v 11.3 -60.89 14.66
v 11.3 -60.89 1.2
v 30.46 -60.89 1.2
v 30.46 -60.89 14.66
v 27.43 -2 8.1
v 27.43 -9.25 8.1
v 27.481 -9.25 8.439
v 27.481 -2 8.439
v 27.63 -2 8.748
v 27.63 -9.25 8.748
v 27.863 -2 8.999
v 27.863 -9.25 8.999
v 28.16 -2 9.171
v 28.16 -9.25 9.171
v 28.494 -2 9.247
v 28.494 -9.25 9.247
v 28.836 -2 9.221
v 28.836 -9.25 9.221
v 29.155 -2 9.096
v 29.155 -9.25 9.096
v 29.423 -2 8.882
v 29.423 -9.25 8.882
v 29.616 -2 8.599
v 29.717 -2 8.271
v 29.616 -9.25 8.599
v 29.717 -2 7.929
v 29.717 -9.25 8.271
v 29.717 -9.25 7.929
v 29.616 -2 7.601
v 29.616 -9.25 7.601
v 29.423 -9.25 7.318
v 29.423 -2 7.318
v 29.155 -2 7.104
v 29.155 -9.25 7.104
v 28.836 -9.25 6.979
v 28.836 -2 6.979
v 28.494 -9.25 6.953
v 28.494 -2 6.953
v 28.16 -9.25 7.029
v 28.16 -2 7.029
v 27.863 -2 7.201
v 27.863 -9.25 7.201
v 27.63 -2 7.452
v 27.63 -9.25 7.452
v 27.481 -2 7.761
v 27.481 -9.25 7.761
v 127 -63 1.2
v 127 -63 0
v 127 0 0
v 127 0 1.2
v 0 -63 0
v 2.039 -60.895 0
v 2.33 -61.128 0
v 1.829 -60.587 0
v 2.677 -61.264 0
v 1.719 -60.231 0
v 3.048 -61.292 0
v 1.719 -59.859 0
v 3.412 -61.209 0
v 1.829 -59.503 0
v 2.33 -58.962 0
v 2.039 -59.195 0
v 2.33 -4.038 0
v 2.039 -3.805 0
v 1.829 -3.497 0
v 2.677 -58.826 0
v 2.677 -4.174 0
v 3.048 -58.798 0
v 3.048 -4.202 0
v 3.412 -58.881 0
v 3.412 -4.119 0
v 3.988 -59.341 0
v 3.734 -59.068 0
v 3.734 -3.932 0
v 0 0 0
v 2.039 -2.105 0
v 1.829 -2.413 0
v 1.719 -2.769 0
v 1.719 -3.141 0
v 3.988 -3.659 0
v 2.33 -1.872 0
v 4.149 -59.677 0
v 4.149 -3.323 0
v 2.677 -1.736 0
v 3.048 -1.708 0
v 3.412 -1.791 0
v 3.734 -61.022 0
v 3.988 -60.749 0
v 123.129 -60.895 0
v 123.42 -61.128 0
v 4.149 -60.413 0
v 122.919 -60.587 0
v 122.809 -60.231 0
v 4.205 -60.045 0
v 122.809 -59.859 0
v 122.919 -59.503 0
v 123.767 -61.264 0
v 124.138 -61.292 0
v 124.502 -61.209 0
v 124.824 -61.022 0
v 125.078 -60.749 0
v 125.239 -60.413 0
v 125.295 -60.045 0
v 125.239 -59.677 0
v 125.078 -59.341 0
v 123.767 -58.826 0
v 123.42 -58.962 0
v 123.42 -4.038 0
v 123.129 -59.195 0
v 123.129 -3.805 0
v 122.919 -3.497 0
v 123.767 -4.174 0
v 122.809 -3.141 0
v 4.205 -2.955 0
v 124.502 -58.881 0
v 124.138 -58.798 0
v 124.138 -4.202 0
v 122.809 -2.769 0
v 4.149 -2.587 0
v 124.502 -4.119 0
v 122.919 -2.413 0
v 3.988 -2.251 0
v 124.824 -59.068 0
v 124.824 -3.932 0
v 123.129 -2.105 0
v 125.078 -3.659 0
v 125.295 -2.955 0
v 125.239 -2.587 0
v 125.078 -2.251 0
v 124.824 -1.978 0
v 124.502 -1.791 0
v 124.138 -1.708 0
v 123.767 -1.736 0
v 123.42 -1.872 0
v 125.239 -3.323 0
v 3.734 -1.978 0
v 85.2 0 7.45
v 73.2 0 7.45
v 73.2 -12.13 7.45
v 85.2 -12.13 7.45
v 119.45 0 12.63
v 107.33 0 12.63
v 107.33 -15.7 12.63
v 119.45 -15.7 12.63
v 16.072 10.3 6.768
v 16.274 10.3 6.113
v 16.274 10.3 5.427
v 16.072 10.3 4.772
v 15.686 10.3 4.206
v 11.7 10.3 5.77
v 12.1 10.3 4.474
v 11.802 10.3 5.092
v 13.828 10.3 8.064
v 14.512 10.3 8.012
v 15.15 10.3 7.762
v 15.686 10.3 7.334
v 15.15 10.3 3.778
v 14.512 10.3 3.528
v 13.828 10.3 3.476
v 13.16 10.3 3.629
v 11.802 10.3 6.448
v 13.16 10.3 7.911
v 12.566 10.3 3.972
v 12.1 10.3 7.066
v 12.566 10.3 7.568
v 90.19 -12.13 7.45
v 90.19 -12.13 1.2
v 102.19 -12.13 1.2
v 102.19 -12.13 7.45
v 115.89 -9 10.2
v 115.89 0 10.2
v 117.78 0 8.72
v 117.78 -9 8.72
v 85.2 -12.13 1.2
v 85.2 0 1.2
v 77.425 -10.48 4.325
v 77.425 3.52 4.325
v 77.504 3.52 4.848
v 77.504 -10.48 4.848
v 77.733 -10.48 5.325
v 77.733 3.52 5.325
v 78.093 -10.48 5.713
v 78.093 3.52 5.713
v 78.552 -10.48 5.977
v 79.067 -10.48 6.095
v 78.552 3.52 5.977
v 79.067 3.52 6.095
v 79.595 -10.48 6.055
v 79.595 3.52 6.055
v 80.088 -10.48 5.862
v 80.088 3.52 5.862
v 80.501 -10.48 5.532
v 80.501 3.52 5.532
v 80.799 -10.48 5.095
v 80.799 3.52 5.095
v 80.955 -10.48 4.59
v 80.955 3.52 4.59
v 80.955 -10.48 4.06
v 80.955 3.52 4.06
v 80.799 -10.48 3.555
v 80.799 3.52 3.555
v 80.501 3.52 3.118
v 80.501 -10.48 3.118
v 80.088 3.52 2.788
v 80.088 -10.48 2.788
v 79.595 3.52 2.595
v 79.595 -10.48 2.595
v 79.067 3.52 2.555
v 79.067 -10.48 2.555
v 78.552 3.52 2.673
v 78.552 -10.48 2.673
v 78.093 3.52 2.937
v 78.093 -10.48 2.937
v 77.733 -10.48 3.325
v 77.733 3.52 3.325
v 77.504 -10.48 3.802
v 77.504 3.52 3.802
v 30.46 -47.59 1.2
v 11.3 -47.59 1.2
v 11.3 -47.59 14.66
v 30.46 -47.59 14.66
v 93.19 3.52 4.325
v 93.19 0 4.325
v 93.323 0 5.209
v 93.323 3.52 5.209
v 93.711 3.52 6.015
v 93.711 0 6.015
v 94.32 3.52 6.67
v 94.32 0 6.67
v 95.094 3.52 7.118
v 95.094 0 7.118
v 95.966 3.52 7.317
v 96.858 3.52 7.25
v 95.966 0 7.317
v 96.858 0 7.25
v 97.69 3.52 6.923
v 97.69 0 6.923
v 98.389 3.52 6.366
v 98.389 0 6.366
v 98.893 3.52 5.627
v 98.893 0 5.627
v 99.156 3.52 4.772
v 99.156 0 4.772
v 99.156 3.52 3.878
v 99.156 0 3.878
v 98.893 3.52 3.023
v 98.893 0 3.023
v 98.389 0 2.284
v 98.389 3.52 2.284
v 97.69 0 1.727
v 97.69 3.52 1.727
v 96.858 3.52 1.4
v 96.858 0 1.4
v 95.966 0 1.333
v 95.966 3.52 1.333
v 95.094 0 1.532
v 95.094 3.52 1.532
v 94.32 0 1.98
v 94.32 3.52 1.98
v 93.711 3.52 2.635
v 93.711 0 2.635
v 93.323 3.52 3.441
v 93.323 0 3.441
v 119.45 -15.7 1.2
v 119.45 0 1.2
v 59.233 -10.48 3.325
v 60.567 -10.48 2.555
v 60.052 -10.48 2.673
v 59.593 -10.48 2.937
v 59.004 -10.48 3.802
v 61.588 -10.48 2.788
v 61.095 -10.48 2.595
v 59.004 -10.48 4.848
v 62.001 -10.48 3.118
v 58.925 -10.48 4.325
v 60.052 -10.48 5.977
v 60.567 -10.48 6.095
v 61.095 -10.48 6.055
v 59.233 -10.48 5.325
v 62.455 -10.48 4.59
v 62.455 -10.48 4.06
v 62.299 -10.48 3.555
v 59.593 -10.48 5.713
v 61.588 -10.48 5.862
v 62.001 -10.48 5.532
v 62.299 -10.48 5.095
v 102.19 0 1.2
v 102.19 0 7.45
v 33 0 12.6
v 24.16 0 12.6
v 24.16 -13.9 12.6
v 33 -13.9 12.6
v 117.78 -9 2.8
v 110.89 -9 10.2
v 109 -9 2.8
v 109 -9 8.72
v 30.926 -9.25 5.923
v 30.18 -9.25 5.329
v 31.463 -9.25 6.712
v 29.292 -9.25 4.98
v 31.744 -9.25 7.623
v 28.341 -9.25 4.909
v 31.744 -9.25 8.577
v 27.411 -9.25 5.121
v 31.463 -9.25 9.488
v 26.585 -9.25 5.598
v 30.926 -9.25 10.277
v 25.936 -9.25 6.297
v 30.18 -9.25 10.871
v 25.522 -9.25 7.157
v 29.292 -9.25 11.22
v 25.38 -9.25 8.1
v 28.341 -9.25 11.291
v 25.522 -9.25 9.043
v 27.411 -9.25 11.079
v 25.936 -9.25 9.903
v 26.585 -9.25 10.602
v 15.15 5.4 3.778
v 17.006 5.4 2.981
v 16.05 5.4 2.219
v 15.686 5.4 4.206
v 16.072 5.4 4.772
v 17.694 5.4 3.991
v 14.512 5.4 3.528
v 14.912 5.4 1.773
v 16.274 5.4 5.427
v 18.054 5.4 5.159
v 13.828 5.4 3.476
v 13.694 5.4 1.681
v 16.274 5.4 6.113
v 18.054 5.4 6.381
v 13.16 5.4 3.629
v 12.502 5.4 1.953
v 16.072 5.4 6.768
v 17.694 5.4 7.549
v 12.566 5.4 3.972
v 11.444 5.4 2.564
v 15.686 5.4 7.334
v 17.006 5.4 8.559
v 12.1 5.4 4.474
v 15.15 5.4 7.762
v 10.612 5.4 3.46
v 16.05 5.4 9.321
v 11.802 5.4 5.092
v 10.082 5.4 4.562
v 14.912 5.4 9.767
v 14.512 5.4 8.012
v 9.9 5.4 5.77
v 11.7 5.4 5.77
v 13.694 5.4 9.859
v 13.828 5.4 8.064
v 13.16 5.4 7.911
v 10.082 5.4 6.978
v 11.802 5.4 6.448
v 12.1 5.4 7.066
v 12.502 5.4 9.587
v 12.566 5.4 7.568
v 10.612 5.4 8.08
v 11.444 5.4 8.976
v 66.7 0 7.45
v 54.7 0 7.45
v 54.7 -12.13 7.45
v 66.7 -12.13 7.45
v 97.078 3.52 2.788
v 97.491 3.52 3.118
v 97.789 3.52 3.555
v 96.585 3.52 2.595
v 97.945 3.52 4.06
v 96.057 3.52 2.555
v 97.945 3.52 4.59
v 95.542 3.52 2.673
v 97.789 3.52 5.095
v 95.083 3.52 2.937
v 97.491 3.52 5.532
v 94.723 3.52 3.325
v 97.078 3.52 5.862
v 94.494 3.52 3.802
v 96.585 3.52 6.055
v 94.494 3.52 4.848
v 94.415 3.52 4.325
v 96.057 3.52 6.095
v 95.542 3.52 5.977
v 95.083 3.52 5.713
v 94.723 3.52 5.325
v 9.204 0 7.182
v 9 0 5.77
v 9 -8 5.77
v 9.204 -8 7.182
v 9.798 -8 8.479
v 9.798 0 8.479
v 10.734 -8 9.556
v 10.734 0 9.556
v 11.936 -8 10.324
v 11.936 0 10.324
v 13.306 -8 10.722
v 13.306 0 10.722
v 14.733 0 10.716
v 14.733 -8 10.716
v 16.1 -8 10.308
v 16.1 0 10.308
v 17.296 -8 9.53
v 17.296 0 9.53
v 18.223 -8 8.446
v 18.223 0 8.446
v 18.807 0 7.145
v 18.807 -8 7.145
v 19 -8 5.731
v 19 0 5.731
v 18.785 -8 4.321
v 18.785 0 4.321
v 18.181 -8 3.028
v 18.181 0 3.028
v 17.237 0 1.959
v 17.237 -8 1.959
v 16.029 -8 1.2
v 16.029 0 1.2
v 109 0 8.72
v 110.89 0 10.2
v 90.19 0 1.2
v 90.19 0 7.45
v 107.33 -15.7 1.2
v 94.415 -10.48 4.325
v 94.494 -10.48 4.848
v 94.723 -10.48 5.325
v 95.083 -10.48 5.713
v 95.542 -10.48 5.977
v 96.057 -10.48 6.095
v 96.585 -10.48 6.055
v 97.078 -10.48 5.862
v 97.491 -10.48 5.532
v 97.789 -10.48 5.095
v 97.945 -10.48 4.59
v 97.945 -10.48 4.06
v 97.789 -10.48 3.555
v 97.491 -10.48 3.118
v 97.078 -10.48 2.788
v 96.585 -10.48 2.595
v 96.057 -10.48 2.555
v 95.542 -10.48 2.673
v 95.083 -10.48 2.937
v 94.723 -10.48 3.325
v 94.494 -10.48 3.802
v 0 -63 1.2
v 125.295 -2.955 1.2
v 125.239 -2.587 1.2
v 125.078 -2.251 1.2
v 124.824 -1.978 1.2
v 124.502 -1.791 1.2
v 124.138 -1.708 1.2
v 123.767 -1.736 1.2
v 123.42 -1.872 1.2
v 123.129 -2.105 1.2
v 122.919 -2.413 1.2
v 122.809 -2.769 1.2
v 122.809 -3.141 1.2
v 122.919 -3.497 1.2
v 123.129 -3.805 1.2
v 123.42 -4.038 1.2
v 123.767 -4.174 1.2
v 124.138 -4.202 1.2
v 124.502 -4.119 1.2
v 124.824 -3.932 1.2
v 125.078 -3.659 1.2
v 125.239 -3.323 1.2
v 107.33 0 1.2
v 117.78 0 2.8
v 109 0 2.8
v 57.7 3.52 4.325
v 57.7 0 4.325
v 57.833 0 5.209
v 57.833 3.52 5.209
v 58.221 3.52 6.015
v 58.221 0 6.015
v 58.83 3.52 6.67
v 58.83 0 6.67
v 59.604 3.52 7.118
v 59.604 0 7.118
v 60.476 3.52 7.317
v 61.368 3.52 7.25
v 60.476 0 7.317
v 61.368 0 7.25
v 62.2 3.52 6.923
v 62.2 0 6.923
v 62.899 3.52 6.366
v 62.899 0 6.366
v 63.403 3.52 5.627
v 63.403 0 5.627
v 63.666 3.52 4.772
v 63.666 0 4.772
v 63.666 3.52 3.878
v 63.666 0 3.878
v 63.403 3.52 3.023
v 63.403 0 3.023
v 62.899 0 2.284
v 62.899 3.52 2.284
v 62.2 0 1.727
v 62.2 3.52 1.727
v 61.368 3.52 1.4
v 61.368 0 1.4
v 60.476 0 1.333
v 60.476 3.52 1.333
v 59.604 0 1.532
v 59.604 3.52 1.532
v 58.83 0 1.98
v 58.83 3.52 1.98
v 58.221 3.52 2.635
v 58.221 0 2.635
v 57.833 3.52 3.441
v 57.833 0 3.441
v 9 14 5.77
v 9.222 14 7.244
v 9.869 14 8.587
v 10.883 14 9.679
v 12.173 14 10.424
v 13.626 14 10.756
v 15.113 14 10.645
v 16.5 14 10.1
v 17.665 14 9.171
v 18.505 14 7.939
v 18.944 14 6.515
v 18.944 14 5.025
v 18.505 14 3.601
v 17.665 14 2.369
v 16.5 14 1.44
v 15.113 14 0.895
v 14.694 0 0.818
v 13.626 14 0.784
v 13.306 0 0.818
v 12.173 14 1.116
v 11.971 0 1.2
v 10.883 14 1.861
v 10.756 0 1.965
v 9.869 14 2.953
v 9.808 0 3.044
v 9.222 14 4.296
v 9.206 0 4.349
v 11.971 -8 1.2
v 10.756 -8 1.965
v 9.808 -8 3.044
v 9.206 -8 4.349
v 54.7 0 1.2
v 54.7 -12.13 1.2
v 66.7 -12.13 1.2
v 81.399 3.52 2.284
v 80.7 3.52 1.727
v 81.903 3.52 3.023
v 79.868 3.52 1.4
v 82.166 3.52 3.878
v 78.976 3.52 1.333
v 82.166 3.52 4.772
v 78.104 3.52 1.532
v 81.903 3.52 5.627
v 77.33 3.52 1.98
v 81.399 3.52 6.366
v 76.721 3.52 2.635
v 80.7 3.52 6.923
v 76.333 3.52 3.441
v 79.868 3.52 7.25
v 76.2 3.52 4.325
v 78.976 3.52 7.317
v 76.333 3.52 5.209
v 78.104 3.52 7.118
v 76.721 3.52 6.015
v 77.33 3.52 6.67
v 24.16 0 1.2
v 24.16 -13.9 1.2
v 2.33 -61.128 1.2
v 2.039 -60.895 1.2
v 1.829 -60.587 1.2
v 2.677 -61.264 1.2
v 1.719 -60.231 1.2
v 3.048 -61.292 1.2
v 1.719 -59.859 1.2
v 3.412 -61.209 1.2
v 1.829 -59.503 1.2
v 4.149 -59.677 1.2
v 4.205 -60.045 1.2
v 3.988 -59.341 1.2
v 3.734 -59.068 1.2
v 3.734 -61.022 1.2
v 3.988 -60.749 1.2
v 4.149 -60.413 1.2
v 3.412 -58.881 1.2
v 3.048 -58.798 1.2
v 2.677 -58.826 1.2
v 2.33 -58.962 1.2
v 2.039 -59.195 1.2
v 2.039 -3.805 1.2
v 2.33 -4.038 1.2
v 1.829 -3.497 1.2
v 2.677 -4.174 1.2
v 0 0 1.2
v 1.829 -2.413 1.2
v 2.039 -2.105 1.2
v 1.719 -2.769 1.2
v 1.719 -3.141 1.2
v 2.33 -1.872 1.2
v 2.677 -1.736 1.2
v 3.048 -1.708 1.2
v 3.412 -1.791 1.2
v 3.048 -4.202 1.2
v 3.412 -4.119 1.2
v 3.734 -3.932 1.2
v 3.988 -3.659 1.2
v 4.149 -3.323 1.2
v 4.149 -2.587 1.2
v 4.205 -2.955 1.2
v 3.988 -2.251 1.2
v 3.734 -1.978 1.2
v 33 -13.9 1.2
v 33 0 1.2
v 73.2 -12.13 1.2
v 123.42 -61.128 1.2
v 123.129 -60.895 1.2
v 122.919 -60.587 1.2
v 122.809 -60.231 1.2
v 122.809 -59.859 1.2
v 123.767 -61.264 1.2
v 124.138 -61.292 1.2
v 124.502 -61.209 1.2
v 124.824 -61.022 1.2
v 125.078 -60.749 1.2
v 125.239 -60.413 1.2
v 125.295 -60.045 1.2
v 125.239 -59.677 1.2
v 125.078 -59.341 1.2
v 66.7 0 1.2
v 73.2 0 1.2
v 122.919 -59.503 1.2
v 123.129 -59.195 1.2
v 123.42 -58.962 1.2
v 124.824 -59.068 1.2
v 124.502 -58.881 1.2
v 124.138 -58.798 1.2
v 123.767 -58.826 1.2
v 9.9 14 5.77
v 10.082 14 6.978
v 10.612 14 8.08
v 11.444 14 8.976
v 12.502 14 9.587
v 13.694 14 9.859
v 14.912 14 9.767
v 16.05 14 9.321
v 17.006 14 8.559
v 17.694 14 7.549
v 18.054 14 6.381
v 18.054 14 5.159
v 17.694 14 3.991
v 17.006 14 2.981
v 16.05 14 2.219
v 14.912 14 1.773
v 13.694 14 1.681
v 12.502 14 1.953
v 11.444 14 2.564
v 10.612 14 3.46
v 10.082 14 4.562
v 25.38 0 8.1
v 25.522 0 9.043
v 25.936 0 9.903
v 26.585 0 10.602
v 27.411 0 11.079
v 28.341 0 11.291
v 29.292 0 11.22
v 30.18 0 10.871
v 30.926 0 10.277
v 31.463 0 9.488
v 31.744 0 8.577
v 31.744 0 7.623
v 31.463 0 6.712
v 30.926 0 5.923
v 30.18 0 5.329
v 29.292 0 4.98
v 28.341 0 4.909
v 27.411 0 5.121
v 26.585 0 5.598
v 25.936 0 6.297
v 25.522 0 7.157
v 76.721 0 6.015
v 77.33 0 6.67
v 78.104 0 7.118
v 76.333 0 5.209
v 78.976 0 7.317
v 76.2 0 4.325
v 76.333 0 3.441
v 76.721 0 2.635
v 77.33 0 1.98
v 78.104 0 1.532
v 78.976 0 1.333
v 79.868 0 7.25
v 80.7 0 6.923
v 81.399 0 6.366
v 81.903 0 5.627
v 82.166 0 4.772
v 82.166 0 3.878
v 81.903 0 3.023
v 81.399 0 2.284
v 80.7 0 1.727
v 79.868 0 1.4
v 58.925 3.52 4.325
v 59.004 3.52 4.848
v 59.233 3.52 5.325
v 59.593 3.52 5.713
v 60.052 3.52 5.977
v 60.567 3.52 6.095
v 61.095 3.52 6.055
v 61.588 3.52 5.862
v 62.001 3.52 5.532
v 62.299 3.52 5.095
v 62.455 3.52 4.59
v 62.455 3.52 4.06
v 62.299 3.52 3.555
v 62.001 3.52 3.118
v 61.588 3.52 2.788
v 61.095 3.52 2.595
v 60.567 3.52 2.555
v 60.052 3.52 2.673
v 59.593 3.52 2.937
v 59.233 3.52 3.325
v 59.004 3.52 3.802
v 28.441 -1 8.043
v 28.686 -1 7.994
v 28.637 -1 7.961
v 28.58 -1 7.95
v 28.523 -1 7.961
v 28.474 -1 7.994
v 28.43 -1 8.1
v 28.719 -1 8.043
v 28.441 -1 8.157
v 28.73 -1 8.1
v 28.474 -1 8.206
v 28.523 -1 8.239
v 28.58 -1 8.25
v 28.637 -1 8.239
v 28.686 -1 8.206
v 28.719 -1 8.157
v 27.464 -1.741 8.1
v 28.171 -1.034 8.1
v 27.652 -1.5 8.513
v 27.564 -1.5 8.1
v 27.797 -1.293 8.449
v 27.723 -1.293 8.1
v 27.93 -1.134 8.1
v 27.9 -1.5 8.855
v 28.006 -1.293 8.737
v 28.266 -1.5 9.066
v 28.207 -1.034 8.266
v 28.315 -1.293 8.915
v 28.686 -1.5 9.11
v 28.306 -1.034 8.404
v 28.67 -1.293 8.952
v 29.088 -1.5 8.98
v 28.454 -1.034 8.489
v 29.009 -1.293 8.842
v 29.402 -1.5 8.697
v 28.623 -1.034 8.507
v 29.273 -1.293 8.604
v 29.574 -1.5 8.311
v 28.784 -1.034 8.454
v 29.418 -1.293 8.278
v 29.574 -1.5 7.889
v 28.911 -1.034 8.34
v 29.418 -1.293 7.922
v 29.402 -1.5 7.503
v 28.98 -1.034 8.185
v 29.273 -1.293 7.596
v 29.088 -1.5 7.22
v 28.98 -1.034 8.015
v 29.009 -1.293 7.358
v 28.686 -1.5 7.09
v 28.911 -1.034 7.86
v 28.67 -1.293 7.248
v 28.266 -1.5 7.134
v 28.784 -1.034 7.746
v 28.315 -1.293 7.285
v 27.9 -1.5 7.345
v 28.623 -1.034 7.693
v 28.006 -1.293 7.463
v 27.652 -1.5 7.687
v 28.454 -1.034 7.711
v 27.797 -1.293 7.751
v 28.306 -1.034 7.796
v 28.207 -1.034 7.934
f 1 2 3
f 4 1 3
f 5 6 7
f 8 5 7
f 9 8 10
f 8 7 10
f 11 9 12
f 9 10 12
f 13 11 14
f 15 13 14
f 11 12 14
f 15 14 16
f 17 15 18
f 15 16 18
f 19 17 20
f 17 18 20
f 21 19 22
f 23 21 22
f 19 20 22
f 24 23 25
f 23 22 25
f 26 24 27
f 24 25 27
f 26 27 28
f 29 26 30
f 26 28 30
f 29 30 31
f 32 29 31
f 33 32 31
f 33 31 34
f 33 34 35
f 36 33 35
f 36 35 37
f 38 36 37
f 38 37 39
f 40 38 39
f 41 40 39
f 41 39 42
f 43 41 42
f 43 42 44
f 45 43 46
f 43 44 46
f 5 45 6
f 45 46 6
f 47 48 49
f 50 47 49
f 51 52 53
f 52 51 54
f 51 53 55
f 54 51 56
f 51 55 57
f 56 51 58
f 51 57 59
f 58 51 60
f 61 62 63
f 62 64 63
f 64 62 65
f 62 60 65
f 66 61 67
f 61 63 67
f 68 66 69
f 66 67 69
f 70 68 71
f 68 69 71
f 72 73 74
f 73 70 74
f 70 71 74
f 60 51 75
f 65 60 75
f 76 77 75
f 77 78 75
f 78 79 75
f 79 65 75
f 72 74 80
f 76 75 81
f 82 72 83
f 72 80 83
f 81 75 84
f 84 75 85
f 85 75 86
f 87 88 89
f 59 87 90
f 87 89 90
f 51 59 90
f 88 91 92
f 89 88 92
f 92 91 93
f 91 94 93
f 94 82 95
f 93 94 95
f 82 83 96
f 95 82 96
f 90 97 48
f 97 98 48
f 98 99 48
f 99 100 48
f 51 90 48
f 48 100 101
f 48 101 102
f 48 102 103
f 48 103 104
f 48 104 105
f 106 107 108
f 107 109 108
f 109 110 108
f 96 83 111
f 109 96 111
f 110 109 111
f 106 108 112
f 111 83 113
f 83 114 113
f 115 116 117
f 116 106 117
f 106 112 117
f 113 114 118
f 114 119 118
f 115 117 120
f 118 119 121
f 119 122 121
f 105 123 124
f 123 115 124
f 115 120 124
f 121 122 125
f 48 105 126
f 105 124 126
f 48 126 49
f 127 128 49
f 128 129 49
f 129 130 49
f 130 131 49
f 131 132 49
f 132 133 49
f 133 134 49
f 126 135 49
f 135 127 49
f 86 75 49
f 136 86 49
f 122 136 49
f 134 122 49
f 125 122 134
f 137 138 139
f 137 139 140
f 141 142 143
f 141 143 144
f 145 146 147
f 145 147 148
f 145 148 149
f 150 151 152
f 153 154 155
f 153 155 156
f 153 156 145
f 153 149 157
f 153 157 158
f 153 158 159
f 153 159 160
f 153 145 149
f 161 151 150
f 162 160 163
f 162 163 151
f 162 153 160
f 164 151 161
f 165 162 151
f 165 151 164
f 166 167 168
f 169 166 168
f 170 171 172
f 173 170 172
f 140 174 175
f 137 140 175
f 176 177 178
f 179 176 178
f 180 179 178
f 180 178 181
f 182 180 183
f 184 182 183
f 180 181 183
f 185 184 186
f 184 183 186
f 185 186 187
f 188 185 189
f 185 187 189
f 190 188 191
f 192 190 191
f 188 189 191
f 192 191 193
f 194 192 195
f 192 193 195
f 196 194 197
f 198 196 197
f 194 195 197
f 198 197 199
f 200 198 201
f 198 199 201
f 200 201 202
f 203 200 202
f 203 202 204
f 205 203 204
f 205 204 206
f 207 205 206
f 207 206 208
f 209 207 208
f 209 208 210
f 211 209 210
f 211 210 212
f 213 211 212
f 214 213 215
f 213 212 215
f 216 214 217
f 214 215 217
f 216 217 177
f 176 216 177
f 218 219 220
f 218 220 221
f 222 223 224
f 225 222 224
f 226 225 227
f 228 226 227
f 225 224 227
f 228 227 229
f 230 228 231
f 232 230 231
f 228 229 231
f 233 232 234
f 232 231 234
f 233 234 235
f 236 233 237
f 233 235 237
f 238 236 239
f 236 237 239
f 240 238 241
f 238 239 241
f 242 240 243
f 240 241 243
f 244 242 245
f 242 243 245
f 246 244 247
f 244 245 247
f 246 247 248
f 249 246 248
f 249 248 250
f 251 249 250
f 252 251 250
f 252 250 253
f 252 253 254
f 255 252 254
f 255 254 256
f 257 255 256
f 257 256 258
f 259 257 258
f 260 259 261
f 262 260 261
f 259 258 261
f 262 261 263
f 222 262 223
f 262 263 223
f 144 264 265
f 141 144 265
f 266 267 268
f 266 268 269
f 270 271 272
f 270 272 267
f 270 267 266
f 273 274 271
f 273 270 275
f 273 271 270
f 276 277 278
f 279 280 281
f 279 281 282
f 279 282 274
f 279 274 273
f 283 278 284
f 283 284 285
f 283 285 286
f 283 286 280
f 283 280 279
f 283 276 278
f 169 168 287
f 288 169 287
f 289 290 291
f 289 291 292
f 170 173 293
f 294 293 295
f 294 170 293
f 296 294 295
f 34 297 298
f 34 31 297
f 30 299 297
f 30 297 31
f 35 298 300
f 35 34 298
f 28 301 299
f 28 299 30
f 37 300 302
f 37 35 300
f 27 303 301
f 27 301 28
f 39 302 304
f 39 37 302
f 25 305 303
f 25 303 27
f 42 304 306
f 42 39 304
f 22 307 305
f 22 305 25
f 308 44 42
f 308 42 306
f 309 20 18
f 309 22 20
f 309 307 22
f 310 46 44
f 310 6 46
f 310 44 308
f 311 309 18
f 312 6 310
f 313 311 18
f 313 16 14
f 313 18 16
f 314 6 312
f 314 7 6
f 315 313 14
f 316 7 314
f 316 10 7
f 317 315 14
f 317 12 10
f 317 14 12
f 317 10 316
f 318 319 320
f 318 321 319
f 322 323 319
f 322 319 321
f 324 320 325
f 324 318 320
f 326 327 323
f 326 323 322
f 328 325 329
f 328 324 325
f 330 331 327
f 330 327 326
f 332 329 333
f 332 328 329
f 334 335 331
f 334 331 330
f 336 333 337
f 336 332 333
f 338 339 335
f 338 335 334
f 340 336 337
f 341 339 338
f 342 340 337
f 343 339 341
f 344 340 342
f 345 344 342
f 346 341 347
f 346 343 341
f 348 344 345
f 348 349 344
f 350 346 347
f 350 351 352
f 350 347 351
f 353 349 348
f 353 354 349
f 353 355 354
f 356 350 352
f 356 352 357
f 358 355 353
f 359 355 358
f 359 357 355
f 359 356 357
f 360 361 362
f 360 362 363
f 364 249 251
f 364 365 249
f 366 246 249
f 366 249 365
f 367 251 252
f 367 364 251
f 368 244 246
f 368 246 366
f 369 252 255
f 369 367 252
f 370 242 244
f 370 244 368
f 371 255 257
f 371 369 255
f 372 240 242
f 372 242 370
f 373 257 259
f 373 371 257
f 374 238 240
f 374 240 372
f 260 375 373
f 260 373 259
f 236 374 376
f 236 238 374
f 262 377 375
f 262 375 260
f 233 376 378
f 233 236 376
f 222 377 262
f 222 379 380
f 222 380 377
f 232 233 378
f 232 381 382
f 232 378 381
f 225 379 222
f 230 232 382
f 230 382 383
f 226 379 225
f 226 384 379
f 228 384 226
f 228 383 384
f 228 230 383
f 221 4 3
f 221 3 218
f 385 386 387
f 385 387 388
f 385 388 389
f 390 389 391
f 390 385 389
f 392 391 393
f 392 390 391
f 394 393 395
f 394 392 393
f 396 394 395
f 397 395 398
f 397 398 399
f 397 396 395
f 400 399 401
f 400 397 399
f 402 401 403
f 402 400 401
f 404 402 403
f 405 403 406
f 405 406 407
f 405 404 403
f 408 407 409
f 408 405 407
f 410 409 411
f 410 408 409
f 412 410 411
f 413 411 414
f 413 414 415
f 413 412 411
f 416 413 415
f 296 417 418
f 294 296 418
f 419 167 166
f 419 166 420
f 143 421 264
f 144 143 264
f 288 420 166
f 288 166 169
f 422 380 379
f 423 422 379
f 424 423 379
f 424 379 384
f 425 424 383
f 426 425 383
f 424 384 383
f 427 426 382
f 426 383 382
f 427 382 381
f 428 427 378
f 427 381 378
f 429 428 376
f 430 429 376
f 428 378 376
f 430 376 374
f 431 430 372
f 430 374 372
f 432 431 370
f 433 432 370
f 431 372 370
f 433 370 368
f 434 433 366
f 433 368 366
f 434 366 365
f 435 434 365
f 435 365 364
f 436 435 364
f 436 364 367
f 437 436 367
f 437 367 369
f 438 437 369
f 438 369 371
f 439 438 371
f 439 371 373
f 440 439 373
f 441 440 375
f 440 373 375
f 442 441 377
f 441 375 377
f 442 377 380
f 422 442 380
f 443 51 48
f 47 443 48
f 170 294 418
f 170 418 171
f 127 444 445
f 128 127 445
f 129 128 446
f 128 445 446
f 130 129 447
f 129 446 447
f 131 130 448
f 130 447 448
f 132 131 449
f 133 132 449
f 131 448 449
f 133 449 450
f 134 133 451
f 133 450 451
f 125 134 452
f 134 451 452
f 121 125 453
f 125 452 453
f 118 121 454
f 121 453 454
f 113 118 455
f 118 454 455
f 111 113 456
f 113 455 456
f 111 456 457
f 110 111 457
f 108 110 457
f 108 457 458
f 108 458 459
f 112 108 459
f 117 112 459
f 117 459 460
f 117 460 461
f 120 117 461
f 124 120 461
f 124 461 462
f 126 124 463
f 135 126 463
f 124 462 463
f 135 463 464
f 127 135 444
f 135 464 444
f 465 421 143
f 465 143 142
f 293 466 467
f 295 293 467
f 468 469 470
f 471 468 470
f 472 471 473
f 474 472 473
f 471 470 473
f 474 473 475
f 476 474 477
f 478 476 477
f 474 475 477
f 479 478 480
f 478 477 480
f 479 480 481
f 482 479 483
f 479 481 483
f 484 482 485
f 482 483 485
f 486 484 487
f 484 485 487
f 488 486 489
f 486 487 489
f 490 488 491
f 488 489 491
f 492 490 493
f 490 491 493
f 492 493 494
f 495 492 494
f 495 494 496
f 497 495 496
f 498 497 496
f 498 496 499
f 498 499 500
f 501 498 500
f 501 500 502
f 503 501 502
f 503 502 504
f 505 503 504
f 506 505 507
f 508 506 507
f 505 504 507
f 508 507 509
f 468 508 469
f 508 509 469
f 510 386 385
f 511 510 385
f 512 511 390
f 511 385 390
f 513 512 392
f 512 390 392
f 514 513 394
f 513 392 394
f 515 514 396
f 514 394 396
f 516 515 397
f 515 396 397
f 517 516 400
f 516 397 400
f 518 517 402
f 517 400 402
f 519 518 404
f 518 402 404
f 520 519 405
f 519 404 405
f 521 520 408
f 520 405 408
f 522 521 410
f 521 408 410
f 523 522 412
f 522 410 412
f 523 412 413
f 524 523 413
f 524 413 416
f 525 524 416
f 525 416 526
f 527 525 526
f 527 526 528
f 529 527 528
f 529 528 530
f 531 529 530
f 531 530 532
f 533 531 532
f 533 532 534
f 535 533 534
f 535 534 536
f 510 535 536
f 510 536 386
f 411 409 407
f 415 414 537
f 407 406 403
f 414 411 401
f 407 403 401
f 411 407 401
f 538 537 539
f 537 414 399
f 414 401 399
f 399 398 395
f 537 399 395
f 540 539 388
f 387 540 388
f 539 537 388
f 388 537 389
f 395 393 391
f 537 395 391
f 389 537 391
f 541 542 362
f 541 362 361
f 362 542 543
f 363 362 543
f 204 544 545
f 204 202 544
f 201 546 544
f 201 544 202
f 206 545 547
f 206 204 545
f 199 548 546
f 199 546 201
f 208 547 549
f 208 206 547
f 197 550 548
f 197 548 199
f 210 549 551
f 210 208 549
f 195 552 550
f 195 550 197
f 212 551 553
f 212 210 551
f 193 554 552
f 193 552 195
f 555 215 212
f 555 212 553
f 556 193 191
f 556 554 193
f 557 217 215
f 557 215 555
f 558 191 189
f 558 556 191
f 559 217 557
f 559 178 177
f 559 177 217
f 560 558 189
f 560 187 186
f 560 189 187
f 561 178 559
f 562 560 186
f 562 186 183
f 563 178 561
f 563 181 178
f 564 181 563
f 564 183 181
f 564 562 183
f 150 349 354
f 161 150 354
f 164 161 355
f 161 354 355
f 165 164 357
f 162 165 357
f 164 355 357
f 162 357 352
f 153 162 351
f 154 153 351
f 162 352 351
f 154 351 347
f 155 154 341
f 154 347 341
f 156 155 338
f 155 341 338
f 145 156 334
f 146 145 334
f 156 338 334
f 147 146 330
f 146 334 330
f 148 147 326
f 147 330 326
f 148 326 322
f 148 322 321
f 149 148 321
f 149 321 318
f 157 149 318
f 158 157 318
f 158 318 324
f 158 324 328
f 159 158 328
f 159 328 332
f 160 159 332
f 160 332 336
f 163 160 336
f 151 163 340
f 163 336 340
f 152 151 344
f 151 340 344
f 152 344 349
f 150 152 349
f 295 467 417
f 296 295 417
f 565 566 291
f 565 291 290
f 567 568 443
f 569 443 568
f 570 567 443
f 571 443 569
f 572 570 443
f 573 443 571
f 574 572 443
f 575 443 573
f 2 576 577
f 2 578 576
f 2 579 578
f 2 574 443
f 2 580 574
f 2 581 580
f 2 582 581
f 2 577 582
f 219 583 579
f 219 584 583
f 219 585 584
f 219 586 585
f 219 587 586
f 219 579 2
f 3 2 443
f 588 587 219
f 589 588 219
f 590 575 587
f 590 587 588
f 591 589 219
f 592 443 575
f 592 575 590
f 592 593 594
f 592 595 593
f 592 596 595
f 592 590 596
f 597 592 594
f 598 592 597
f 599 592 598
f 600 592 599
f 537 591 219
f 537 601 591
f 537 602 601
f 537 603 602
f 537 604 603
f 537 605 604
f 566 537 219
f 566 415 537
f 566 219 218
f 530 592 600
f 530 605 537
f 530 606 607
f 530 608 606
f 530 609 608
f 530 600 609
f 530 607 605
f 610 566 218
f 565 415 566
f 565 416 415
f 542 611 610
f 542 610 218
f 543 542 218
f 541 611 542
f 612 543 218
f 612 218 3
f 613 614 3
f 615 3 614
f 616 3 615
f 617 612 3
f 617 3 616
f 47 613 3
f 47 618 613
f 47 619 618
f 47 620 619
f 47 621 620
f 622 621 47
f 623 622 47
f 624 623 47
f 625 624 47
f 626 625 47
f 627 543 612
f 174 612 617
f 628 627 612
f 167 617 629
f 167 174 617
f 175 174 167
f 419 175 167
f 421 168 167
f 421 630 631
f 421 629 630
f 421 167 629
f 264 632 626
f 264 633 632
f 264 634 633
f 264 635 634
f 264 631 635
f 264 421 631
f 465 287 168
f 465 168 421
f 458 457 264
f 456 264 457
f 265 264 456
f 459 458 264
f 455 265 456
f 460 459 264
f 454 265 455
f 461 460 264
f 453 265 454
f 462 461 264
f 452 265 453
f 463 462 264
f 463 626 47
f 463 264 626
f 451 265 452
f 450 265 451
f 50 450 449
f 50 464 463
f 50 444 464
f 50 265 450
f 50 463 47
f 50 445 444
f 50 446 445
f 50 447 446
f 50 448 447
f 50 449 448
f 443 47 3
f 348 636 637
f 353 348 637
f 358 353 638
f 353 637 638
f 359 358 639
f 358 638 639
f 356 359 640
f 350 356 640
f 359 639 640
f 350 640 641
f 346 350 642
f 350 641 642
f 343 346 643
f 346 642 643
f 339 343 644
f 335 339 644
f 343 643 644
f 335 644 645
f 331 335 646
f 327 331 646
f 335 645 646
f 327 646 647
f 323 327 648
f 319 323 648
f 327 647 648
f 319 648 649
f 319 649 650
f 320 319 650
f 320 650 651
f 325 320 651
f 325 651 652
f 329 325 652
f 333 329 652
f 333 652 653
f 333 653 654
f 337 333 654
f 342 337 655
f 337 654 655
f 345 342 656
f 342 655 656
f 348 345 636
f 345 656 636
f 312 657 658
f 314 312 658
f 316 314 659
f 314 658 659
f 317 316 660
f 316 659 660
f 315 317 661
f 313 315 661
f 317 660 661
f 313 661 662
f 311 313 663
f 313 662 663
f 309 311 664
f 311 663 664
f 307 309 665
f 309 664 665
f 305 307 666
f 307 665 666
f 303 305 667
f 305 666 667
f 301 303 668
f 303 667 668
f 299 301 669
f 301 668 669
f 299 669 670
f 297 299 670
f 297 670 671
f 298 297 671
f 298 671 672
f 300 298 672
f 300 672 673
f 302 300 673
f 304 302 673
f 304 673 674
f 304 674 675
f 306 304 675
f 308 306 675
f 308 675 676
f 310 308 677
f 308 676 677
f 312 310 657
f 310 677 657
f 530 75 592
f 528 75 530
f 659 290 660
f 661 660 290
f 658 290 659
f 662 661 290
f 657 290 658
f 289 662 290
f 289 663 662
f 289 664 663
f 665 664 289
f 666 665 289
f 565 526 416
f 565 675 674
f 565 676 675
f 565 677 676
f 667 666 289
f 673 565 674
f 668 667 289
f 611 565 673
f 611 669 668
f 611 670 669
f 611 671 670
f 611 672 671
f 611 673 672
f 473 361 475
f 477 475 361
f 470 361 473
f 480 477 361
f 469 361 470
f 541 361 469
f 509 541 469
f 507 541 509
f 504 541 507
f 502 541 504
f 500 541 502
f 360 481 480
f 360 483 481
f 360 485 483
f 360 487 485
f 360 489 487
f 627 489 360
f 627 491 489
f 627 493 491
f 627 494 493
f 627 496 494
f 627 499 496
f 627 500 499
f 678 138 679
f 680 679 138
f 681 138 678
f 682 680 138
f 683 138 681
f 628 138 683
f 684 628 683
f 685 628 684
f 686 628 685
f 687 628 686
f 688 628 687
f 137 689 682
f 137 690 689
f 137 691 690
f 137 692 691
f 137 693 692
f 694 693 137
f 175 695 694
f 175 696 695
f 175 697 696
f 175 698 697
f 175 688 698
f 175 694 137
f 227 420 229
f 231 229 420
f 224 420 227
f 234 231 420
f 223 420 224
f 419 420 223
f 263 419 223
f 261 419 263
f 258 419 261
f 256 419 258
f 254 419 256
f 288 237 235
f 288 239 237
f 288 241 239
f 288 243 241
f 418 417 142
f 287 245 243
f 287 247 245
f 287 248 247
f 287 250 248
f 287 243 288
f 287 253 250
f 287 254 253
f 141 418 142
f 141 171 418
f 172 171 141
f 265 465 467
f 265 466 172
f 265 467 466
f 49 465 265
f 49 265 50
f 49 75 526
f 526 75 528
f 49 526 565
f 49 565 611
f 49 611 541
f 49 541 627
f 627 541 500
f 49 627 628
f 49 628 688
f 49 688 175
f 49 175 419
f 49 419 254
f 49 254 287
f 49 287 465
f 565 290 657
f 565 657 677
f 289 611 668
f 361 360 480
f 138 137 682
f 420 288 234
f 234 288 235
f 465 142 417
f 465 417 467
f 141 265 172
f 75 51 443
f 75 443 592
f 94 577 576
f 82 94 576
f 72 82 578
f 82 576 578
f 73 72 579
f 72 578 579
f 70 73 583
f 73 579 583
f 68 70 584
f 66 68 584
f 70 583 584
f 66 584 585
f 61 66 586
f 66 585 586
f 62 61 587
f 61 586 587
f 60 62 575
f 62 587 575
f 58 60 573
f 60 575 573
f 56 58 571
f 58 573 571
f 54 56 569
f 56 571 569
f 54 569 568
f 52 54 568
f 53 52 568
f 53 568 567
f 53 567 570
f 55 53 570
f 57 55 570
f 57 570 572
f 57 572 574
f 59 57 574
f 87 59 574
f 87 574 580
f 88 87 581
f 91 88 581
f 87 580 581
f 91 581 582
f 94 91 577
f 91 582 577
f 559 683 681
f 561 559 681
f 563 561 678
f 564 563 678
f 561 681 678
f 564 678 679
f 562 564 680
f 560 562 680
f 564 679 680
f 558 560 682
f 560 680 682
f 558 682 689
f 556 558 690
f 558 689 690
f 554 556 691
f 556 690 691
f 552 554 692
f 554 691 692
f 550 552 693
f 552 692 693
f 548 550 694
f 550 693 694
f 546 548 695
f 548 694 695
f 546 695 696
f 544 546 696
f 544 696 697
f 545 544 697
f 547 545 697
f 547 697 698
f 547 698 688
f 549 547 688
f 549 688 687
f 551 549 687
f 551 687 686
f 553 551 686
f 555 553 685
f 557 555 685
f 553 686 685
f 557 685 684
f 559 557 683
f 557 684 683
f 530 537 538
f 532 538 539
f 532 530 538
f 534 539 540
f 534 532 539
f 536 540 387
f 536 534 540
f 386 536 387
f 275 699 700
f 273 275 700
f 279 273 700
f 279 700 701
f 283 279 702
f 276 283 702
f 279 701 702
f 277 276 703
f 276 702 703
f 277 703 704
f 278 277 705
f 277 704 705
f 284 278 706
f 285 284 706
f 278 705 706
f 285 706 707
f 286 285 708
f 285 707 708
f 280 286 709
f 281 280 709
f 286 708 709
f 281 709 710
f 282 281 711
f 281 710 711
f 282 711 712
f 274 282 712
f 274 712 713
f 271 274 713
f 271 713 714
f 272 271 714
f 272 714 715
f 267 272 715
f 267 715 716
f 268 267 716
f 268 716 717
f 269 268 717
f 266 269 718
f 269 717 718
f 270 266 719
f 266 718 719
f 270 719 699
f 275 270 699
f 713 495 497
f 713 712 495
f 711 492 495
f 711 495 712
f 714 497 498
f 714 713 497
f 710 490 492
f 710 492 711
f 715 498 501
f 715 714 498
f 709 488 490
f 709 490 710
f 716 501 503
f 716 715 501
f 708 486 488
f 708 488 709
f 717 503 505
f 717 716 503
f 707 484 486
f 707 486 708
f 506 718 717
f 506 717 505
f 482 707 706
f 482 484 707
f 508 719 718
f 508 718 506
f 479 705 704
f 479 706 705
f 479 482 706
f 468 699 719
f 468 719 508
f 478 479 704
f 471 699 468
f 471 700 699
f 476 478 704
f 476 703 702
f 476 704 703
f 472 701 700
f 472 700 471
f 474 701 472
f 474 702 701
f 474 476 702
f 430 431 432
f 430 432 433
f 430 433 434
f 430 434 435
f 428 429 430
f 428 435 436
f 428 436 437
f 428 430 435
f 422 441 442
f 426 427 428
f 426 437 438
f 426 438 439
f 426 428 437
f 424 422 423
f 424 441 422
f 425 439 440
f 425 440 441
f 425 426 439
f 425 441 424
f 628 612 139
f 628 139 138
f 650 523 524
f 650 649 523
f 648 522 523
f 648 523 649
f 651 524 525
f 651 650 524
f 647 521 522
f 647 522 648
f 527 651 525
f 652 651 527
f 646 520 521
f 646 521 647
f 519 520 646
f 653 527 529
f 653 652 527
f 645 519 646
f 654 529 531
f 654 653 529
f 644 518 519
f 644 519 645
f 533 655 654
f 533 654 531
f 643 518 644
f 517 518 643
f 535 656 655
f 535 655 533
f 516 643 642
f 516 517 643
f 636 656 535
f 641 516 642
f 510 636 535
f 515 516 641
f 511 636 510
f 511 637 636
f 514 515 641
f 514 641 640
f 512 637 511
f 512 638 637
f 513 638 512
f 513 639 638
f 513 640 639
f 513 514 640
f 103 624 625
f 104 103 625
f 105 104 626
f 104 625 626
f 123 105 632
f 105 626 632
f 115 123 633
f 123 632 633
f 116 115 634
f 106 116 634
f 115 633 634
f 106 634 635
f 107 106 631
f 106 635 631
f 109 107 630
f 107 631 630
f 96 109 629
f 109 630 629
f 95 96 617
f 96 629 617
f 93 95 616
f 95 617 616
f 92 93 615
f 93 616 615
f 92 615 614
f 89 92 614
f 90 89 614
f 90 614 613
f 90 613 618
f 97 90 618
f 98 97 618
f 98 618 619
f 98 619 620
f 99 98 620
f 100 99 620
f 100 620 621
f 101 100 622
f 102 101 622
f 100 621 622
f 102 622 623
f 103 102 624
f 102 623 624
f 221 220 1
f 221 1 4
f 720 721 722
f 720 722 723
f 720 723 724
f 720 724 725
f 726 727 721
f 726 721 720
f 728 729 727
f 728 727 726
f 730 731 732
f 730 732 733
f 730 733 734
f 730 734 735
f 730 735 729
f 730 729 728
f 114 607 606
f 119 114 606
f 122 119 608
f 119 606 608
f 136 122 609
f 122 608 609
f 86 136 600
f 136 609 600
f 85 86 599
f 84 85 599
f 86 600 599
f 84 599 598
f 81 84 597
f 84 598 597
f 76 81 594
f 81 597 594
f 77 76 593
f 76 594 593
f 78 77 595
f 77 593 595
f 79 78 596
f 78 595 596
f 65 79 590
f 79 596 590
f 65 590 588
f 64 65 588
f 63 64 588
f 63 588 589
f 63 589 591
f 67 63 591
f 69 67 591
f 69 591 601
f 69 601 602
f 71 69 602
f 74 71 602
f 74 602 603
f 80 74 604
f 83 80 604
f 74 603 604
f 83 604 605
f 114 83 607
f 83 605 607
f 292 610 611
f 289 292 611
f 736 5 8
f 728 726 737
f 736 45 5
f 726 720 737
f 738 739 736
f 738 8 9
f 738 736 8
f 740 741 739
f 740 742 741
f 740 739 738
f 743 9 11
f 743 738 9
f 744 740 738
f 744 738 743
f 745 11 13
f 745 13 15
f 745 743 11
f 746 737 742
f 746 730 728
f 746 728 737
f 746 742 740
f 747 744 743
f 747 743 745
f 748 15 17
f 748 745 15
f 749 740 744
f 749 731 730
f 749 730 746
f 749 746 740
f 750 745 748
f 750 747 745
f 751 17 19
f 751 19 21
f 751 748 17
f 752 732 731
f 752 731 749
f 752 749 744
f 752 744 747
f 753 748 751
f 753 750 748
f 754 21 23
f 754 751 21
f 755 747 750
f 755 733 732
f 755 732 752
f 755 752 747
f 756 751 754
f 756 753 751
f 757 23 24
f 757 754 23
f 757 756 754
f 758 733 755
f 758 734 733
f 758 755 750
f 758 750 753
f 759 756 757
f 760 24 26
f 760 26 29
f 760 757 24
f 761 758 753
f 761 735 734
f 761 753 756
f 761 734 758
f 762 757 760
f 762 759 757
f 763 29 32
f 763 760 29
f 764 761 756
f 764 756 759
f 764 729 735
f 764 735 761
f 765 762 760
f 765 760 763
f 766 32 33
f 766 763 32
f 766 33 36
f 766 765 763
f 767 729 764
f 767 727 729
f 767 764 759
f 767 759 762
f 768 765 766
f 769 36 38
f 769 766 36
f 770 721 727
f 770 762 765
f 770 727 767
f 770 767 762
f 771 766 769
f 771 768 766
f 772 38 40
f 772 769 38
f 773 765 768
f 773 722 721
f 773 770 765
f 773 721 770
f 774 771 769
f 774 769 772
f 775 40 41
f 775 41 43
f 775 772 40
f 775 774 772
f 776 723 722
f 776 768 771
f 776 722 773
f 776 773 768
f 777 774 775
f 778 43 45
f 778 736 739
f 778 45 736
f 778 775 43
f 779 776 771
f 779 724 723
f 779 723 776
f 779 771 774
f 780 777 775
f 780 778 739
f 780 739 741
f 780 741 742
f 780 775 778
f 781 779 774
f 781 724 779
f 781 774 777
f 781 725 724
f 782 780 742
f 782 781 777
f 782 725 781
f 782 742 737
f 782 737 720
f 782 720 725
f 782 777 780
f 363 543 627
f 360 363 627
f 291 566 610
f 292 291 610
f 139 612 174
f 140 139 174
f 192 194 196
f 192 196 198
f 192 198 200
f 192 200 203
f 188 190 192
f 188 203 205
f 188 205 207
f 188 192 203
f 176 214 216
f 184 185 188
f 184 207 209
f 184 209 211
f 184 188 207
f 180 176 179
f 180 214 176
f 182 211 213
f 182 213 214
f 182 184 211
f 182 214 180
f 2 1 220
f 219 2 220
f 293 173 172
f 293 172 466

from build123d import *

# Parameters (mm, degrees)
F0_W           = 127
F0_H           = 63
F1_DEPTH       = 1.2
F2_R           = 1.25
F3_DEPTH       = 1.2
F4_W           = 12
F4_H           = 12.13
F5_DEPTH       = 6.25
F6_R           = 3
F7_DEPTH       = 3.52
F8_R           = 1.775
F9_DEPTH       = 14
F10_W          = 12.12
F10_H          = 15.7
F11_DEPTH      = 11.43
F13_DEPTH      = 9
F14_W          = 8.84
F14_H          = 13.9
F15_DEPTH      = 11.4
F16_R          = 3.2
F17_DEPTH      = 9.25
F18_R          = 1.15
F19_DEPTH      = 8.25
F20_R          = 1
F21_R          = 5
F22_DEPTH      = 14
F22_DEPTH_BACK = 8
F23_R          = 4.1
F24_DEPTH      = 8.6
F25_R          = 2.3
F26_DEPTH      = 4.9
F27_W          = 19.16
F27_H          = 13.3
F28_DEPTH      = 13.46


with BuildPart() as f1:
    # F0 (on Top) → F1 (new body)
    with BuildSketch(Plane.XY):
        with Locations((63.5, -31.5)):
            Rectangle(F0_W, F0_H)
    extrude(amount=F1_DEPTH)

    # F2 (on face) → F3 (cut, through all)
    with BuildSketch(Plane.XY.offset(1.2)):
        with Locations((2.955, -2.955)):
            Circle(F2_R)
        with Locations((2.955, -60.045)):
            Circle(F2_R)
        with Locations((124.045, -60.045)):
            Circle(F2_R)
        with Locations((124.045, -2.955)):
            Circle(F2_R)
    extrude(amount=-F3_DEPTH, mode=Mode.SUBTRACT)

    # F4 (on face) → F5 (join)
    with BuildSketch(Plane.XY.offset(1.2)):
        with Locations((96.19, -6.065)):
            Rectangle(F4_W, F4_H)
        with Locations((79.2, -6.065)):
            Rectangle(F4_W, F4_H)
        with Locations((60.7, -6.065)):
            Rectangle(F4_W, F4_H)
    extrude(amount=F5_DEPTH)

    # F6 (on face) → F7 (join)
    with BuildSketch(Plane(origin=(0, 0, 0), x_dir=(-1, 0, 0), z_dir=(0, 1, 0))):
        with Locations((-96.19, 4.325)):
            Circle(F6_R)
        with Locations((-79.2, 4.325)):
            Circle(F6_R)
        with Locations((-60.7, 4.325)):
            Circle(F6_R)
    extrude(amount=F7_DEPTH)

    # F8 (on face) → F9 (cut)
    with BuildSketch(Plane(origin=(0, 3.52, 0), x_dir=(-1, 0, 0), z_dir=(0, 1, 0))):
        with Locations((-96.19, 4.325)):
            Circle(F8_R)
        with Locations((-79.2, 4.325)):
            Circle(F8_R)
        with Locations((-60.7, 4.325)):
            Circle(F8_R)
    extrude(amount=-F9_DEPTH, mode=Mode.SUBTRACT)

    # F10 (on face) → F11 (join)
    with BuildSketch(Plane.XY.offset(1.2)):
        with Locations((113.39, -7.85)):
            Rectangle(F10_W, F10_H)
    extrude(amount=F11_DEPTH)

    # F12 (on face) → F13 (cut)
    with BuildSketch(Plane(origin=(0, 0, 0), x_dir=(-1, 0, 0), z_dir=(0, 1, 0))):
        Polygon((-117.78, 8.72), (-117.78, 2.8), (-109, 2.8), (-109, 8.72), (-110.89, 10.2), (-115.89, 10.2), align=None)
    extrude(amount=-F13_DEPTH, mode=Mode.SUBTRACT)

    # F14 (on face) → F15 (join)
    with BuildSketch(Plane.XY.offset(1.2)):
        with Locations((28.58, -6.95)):
            Rectangle(F14_W, F14_H)
    extrude(amount=F15_DEPTH)

    # F16 (on face) → F17 (cut)
    with BuildSketch(Plane(origin=(0, 0, 0), x_dir=(-1, 0, 0), z_dir=(0, 1, 0))):
        with Locations((-28.58, 8.1)):
            Circle(F16_R)
    extrude(amount=-F17_DEPTH, mode=Mode.SUBTRACT)

    # F18 (on face) → F19 (join, through all)
    with BuildSketch(Plane(origin=(0, -9.25, 0), x_dir=(-1, 0, 0), z_dir=(0, 1, 0))):
        with Locations((-28.58, 8.1)):
            Circle(F18_R)
    extrude(amount=F19_DEPTH)

    # F20
    f20_edges = [f1.edges().sort_by_distance(p)[0] for p in [
        (29.73, -1, 8.1),
    ]]
    fillet(f20_edges, radius=F20_R)

    # F21 (on face) → F22 (join, two sides)
    with BuildSketch(Plane(origin=(0, 0, 0), x_dir=(-1, 0, 0), z_dir=(0, 1, 0))) as f22_sk:
        with Locations((-14, 5.77)):
            Circle(F21_R)
    extrude(amount=F22_DEPTH)
    extrude(f22_sk.sketch, amount=-F22_DEPTH_BACK)

    # F23 (on face) → F24 (cut)
    with BuildSketch(Plane(origin=(0, 14, 0), x_dir=(-1, 0, 0), z_dir=(0, 1, 0))):
        with Locations((-14, 5.77)):
            Circle(F23_R)
    extrude(amount=-F24_DEPTH, mode=Mode.SUBTRACT)

    # F25 (on face) → F26 (join, through all)
    with BuildSketch(Plane(origin=(0, 5.4, 0), x_dir=(-1, 0, 0), z_dir=(0, 1, 0))):
        with Locations((-14, 5.77)):
            Circle(F25_R)
    extrude(amount=F26_DEPTH)

    # F27 (on face) → F28 (join)
    with BuildSketch(Plane.XY.offset(1.2)):
        with Locations((20.88, -54.24)):
            Rectangle(F27_W, F27_H)
    extrude(amount=F28_DEPTH)


solid = f1.part
